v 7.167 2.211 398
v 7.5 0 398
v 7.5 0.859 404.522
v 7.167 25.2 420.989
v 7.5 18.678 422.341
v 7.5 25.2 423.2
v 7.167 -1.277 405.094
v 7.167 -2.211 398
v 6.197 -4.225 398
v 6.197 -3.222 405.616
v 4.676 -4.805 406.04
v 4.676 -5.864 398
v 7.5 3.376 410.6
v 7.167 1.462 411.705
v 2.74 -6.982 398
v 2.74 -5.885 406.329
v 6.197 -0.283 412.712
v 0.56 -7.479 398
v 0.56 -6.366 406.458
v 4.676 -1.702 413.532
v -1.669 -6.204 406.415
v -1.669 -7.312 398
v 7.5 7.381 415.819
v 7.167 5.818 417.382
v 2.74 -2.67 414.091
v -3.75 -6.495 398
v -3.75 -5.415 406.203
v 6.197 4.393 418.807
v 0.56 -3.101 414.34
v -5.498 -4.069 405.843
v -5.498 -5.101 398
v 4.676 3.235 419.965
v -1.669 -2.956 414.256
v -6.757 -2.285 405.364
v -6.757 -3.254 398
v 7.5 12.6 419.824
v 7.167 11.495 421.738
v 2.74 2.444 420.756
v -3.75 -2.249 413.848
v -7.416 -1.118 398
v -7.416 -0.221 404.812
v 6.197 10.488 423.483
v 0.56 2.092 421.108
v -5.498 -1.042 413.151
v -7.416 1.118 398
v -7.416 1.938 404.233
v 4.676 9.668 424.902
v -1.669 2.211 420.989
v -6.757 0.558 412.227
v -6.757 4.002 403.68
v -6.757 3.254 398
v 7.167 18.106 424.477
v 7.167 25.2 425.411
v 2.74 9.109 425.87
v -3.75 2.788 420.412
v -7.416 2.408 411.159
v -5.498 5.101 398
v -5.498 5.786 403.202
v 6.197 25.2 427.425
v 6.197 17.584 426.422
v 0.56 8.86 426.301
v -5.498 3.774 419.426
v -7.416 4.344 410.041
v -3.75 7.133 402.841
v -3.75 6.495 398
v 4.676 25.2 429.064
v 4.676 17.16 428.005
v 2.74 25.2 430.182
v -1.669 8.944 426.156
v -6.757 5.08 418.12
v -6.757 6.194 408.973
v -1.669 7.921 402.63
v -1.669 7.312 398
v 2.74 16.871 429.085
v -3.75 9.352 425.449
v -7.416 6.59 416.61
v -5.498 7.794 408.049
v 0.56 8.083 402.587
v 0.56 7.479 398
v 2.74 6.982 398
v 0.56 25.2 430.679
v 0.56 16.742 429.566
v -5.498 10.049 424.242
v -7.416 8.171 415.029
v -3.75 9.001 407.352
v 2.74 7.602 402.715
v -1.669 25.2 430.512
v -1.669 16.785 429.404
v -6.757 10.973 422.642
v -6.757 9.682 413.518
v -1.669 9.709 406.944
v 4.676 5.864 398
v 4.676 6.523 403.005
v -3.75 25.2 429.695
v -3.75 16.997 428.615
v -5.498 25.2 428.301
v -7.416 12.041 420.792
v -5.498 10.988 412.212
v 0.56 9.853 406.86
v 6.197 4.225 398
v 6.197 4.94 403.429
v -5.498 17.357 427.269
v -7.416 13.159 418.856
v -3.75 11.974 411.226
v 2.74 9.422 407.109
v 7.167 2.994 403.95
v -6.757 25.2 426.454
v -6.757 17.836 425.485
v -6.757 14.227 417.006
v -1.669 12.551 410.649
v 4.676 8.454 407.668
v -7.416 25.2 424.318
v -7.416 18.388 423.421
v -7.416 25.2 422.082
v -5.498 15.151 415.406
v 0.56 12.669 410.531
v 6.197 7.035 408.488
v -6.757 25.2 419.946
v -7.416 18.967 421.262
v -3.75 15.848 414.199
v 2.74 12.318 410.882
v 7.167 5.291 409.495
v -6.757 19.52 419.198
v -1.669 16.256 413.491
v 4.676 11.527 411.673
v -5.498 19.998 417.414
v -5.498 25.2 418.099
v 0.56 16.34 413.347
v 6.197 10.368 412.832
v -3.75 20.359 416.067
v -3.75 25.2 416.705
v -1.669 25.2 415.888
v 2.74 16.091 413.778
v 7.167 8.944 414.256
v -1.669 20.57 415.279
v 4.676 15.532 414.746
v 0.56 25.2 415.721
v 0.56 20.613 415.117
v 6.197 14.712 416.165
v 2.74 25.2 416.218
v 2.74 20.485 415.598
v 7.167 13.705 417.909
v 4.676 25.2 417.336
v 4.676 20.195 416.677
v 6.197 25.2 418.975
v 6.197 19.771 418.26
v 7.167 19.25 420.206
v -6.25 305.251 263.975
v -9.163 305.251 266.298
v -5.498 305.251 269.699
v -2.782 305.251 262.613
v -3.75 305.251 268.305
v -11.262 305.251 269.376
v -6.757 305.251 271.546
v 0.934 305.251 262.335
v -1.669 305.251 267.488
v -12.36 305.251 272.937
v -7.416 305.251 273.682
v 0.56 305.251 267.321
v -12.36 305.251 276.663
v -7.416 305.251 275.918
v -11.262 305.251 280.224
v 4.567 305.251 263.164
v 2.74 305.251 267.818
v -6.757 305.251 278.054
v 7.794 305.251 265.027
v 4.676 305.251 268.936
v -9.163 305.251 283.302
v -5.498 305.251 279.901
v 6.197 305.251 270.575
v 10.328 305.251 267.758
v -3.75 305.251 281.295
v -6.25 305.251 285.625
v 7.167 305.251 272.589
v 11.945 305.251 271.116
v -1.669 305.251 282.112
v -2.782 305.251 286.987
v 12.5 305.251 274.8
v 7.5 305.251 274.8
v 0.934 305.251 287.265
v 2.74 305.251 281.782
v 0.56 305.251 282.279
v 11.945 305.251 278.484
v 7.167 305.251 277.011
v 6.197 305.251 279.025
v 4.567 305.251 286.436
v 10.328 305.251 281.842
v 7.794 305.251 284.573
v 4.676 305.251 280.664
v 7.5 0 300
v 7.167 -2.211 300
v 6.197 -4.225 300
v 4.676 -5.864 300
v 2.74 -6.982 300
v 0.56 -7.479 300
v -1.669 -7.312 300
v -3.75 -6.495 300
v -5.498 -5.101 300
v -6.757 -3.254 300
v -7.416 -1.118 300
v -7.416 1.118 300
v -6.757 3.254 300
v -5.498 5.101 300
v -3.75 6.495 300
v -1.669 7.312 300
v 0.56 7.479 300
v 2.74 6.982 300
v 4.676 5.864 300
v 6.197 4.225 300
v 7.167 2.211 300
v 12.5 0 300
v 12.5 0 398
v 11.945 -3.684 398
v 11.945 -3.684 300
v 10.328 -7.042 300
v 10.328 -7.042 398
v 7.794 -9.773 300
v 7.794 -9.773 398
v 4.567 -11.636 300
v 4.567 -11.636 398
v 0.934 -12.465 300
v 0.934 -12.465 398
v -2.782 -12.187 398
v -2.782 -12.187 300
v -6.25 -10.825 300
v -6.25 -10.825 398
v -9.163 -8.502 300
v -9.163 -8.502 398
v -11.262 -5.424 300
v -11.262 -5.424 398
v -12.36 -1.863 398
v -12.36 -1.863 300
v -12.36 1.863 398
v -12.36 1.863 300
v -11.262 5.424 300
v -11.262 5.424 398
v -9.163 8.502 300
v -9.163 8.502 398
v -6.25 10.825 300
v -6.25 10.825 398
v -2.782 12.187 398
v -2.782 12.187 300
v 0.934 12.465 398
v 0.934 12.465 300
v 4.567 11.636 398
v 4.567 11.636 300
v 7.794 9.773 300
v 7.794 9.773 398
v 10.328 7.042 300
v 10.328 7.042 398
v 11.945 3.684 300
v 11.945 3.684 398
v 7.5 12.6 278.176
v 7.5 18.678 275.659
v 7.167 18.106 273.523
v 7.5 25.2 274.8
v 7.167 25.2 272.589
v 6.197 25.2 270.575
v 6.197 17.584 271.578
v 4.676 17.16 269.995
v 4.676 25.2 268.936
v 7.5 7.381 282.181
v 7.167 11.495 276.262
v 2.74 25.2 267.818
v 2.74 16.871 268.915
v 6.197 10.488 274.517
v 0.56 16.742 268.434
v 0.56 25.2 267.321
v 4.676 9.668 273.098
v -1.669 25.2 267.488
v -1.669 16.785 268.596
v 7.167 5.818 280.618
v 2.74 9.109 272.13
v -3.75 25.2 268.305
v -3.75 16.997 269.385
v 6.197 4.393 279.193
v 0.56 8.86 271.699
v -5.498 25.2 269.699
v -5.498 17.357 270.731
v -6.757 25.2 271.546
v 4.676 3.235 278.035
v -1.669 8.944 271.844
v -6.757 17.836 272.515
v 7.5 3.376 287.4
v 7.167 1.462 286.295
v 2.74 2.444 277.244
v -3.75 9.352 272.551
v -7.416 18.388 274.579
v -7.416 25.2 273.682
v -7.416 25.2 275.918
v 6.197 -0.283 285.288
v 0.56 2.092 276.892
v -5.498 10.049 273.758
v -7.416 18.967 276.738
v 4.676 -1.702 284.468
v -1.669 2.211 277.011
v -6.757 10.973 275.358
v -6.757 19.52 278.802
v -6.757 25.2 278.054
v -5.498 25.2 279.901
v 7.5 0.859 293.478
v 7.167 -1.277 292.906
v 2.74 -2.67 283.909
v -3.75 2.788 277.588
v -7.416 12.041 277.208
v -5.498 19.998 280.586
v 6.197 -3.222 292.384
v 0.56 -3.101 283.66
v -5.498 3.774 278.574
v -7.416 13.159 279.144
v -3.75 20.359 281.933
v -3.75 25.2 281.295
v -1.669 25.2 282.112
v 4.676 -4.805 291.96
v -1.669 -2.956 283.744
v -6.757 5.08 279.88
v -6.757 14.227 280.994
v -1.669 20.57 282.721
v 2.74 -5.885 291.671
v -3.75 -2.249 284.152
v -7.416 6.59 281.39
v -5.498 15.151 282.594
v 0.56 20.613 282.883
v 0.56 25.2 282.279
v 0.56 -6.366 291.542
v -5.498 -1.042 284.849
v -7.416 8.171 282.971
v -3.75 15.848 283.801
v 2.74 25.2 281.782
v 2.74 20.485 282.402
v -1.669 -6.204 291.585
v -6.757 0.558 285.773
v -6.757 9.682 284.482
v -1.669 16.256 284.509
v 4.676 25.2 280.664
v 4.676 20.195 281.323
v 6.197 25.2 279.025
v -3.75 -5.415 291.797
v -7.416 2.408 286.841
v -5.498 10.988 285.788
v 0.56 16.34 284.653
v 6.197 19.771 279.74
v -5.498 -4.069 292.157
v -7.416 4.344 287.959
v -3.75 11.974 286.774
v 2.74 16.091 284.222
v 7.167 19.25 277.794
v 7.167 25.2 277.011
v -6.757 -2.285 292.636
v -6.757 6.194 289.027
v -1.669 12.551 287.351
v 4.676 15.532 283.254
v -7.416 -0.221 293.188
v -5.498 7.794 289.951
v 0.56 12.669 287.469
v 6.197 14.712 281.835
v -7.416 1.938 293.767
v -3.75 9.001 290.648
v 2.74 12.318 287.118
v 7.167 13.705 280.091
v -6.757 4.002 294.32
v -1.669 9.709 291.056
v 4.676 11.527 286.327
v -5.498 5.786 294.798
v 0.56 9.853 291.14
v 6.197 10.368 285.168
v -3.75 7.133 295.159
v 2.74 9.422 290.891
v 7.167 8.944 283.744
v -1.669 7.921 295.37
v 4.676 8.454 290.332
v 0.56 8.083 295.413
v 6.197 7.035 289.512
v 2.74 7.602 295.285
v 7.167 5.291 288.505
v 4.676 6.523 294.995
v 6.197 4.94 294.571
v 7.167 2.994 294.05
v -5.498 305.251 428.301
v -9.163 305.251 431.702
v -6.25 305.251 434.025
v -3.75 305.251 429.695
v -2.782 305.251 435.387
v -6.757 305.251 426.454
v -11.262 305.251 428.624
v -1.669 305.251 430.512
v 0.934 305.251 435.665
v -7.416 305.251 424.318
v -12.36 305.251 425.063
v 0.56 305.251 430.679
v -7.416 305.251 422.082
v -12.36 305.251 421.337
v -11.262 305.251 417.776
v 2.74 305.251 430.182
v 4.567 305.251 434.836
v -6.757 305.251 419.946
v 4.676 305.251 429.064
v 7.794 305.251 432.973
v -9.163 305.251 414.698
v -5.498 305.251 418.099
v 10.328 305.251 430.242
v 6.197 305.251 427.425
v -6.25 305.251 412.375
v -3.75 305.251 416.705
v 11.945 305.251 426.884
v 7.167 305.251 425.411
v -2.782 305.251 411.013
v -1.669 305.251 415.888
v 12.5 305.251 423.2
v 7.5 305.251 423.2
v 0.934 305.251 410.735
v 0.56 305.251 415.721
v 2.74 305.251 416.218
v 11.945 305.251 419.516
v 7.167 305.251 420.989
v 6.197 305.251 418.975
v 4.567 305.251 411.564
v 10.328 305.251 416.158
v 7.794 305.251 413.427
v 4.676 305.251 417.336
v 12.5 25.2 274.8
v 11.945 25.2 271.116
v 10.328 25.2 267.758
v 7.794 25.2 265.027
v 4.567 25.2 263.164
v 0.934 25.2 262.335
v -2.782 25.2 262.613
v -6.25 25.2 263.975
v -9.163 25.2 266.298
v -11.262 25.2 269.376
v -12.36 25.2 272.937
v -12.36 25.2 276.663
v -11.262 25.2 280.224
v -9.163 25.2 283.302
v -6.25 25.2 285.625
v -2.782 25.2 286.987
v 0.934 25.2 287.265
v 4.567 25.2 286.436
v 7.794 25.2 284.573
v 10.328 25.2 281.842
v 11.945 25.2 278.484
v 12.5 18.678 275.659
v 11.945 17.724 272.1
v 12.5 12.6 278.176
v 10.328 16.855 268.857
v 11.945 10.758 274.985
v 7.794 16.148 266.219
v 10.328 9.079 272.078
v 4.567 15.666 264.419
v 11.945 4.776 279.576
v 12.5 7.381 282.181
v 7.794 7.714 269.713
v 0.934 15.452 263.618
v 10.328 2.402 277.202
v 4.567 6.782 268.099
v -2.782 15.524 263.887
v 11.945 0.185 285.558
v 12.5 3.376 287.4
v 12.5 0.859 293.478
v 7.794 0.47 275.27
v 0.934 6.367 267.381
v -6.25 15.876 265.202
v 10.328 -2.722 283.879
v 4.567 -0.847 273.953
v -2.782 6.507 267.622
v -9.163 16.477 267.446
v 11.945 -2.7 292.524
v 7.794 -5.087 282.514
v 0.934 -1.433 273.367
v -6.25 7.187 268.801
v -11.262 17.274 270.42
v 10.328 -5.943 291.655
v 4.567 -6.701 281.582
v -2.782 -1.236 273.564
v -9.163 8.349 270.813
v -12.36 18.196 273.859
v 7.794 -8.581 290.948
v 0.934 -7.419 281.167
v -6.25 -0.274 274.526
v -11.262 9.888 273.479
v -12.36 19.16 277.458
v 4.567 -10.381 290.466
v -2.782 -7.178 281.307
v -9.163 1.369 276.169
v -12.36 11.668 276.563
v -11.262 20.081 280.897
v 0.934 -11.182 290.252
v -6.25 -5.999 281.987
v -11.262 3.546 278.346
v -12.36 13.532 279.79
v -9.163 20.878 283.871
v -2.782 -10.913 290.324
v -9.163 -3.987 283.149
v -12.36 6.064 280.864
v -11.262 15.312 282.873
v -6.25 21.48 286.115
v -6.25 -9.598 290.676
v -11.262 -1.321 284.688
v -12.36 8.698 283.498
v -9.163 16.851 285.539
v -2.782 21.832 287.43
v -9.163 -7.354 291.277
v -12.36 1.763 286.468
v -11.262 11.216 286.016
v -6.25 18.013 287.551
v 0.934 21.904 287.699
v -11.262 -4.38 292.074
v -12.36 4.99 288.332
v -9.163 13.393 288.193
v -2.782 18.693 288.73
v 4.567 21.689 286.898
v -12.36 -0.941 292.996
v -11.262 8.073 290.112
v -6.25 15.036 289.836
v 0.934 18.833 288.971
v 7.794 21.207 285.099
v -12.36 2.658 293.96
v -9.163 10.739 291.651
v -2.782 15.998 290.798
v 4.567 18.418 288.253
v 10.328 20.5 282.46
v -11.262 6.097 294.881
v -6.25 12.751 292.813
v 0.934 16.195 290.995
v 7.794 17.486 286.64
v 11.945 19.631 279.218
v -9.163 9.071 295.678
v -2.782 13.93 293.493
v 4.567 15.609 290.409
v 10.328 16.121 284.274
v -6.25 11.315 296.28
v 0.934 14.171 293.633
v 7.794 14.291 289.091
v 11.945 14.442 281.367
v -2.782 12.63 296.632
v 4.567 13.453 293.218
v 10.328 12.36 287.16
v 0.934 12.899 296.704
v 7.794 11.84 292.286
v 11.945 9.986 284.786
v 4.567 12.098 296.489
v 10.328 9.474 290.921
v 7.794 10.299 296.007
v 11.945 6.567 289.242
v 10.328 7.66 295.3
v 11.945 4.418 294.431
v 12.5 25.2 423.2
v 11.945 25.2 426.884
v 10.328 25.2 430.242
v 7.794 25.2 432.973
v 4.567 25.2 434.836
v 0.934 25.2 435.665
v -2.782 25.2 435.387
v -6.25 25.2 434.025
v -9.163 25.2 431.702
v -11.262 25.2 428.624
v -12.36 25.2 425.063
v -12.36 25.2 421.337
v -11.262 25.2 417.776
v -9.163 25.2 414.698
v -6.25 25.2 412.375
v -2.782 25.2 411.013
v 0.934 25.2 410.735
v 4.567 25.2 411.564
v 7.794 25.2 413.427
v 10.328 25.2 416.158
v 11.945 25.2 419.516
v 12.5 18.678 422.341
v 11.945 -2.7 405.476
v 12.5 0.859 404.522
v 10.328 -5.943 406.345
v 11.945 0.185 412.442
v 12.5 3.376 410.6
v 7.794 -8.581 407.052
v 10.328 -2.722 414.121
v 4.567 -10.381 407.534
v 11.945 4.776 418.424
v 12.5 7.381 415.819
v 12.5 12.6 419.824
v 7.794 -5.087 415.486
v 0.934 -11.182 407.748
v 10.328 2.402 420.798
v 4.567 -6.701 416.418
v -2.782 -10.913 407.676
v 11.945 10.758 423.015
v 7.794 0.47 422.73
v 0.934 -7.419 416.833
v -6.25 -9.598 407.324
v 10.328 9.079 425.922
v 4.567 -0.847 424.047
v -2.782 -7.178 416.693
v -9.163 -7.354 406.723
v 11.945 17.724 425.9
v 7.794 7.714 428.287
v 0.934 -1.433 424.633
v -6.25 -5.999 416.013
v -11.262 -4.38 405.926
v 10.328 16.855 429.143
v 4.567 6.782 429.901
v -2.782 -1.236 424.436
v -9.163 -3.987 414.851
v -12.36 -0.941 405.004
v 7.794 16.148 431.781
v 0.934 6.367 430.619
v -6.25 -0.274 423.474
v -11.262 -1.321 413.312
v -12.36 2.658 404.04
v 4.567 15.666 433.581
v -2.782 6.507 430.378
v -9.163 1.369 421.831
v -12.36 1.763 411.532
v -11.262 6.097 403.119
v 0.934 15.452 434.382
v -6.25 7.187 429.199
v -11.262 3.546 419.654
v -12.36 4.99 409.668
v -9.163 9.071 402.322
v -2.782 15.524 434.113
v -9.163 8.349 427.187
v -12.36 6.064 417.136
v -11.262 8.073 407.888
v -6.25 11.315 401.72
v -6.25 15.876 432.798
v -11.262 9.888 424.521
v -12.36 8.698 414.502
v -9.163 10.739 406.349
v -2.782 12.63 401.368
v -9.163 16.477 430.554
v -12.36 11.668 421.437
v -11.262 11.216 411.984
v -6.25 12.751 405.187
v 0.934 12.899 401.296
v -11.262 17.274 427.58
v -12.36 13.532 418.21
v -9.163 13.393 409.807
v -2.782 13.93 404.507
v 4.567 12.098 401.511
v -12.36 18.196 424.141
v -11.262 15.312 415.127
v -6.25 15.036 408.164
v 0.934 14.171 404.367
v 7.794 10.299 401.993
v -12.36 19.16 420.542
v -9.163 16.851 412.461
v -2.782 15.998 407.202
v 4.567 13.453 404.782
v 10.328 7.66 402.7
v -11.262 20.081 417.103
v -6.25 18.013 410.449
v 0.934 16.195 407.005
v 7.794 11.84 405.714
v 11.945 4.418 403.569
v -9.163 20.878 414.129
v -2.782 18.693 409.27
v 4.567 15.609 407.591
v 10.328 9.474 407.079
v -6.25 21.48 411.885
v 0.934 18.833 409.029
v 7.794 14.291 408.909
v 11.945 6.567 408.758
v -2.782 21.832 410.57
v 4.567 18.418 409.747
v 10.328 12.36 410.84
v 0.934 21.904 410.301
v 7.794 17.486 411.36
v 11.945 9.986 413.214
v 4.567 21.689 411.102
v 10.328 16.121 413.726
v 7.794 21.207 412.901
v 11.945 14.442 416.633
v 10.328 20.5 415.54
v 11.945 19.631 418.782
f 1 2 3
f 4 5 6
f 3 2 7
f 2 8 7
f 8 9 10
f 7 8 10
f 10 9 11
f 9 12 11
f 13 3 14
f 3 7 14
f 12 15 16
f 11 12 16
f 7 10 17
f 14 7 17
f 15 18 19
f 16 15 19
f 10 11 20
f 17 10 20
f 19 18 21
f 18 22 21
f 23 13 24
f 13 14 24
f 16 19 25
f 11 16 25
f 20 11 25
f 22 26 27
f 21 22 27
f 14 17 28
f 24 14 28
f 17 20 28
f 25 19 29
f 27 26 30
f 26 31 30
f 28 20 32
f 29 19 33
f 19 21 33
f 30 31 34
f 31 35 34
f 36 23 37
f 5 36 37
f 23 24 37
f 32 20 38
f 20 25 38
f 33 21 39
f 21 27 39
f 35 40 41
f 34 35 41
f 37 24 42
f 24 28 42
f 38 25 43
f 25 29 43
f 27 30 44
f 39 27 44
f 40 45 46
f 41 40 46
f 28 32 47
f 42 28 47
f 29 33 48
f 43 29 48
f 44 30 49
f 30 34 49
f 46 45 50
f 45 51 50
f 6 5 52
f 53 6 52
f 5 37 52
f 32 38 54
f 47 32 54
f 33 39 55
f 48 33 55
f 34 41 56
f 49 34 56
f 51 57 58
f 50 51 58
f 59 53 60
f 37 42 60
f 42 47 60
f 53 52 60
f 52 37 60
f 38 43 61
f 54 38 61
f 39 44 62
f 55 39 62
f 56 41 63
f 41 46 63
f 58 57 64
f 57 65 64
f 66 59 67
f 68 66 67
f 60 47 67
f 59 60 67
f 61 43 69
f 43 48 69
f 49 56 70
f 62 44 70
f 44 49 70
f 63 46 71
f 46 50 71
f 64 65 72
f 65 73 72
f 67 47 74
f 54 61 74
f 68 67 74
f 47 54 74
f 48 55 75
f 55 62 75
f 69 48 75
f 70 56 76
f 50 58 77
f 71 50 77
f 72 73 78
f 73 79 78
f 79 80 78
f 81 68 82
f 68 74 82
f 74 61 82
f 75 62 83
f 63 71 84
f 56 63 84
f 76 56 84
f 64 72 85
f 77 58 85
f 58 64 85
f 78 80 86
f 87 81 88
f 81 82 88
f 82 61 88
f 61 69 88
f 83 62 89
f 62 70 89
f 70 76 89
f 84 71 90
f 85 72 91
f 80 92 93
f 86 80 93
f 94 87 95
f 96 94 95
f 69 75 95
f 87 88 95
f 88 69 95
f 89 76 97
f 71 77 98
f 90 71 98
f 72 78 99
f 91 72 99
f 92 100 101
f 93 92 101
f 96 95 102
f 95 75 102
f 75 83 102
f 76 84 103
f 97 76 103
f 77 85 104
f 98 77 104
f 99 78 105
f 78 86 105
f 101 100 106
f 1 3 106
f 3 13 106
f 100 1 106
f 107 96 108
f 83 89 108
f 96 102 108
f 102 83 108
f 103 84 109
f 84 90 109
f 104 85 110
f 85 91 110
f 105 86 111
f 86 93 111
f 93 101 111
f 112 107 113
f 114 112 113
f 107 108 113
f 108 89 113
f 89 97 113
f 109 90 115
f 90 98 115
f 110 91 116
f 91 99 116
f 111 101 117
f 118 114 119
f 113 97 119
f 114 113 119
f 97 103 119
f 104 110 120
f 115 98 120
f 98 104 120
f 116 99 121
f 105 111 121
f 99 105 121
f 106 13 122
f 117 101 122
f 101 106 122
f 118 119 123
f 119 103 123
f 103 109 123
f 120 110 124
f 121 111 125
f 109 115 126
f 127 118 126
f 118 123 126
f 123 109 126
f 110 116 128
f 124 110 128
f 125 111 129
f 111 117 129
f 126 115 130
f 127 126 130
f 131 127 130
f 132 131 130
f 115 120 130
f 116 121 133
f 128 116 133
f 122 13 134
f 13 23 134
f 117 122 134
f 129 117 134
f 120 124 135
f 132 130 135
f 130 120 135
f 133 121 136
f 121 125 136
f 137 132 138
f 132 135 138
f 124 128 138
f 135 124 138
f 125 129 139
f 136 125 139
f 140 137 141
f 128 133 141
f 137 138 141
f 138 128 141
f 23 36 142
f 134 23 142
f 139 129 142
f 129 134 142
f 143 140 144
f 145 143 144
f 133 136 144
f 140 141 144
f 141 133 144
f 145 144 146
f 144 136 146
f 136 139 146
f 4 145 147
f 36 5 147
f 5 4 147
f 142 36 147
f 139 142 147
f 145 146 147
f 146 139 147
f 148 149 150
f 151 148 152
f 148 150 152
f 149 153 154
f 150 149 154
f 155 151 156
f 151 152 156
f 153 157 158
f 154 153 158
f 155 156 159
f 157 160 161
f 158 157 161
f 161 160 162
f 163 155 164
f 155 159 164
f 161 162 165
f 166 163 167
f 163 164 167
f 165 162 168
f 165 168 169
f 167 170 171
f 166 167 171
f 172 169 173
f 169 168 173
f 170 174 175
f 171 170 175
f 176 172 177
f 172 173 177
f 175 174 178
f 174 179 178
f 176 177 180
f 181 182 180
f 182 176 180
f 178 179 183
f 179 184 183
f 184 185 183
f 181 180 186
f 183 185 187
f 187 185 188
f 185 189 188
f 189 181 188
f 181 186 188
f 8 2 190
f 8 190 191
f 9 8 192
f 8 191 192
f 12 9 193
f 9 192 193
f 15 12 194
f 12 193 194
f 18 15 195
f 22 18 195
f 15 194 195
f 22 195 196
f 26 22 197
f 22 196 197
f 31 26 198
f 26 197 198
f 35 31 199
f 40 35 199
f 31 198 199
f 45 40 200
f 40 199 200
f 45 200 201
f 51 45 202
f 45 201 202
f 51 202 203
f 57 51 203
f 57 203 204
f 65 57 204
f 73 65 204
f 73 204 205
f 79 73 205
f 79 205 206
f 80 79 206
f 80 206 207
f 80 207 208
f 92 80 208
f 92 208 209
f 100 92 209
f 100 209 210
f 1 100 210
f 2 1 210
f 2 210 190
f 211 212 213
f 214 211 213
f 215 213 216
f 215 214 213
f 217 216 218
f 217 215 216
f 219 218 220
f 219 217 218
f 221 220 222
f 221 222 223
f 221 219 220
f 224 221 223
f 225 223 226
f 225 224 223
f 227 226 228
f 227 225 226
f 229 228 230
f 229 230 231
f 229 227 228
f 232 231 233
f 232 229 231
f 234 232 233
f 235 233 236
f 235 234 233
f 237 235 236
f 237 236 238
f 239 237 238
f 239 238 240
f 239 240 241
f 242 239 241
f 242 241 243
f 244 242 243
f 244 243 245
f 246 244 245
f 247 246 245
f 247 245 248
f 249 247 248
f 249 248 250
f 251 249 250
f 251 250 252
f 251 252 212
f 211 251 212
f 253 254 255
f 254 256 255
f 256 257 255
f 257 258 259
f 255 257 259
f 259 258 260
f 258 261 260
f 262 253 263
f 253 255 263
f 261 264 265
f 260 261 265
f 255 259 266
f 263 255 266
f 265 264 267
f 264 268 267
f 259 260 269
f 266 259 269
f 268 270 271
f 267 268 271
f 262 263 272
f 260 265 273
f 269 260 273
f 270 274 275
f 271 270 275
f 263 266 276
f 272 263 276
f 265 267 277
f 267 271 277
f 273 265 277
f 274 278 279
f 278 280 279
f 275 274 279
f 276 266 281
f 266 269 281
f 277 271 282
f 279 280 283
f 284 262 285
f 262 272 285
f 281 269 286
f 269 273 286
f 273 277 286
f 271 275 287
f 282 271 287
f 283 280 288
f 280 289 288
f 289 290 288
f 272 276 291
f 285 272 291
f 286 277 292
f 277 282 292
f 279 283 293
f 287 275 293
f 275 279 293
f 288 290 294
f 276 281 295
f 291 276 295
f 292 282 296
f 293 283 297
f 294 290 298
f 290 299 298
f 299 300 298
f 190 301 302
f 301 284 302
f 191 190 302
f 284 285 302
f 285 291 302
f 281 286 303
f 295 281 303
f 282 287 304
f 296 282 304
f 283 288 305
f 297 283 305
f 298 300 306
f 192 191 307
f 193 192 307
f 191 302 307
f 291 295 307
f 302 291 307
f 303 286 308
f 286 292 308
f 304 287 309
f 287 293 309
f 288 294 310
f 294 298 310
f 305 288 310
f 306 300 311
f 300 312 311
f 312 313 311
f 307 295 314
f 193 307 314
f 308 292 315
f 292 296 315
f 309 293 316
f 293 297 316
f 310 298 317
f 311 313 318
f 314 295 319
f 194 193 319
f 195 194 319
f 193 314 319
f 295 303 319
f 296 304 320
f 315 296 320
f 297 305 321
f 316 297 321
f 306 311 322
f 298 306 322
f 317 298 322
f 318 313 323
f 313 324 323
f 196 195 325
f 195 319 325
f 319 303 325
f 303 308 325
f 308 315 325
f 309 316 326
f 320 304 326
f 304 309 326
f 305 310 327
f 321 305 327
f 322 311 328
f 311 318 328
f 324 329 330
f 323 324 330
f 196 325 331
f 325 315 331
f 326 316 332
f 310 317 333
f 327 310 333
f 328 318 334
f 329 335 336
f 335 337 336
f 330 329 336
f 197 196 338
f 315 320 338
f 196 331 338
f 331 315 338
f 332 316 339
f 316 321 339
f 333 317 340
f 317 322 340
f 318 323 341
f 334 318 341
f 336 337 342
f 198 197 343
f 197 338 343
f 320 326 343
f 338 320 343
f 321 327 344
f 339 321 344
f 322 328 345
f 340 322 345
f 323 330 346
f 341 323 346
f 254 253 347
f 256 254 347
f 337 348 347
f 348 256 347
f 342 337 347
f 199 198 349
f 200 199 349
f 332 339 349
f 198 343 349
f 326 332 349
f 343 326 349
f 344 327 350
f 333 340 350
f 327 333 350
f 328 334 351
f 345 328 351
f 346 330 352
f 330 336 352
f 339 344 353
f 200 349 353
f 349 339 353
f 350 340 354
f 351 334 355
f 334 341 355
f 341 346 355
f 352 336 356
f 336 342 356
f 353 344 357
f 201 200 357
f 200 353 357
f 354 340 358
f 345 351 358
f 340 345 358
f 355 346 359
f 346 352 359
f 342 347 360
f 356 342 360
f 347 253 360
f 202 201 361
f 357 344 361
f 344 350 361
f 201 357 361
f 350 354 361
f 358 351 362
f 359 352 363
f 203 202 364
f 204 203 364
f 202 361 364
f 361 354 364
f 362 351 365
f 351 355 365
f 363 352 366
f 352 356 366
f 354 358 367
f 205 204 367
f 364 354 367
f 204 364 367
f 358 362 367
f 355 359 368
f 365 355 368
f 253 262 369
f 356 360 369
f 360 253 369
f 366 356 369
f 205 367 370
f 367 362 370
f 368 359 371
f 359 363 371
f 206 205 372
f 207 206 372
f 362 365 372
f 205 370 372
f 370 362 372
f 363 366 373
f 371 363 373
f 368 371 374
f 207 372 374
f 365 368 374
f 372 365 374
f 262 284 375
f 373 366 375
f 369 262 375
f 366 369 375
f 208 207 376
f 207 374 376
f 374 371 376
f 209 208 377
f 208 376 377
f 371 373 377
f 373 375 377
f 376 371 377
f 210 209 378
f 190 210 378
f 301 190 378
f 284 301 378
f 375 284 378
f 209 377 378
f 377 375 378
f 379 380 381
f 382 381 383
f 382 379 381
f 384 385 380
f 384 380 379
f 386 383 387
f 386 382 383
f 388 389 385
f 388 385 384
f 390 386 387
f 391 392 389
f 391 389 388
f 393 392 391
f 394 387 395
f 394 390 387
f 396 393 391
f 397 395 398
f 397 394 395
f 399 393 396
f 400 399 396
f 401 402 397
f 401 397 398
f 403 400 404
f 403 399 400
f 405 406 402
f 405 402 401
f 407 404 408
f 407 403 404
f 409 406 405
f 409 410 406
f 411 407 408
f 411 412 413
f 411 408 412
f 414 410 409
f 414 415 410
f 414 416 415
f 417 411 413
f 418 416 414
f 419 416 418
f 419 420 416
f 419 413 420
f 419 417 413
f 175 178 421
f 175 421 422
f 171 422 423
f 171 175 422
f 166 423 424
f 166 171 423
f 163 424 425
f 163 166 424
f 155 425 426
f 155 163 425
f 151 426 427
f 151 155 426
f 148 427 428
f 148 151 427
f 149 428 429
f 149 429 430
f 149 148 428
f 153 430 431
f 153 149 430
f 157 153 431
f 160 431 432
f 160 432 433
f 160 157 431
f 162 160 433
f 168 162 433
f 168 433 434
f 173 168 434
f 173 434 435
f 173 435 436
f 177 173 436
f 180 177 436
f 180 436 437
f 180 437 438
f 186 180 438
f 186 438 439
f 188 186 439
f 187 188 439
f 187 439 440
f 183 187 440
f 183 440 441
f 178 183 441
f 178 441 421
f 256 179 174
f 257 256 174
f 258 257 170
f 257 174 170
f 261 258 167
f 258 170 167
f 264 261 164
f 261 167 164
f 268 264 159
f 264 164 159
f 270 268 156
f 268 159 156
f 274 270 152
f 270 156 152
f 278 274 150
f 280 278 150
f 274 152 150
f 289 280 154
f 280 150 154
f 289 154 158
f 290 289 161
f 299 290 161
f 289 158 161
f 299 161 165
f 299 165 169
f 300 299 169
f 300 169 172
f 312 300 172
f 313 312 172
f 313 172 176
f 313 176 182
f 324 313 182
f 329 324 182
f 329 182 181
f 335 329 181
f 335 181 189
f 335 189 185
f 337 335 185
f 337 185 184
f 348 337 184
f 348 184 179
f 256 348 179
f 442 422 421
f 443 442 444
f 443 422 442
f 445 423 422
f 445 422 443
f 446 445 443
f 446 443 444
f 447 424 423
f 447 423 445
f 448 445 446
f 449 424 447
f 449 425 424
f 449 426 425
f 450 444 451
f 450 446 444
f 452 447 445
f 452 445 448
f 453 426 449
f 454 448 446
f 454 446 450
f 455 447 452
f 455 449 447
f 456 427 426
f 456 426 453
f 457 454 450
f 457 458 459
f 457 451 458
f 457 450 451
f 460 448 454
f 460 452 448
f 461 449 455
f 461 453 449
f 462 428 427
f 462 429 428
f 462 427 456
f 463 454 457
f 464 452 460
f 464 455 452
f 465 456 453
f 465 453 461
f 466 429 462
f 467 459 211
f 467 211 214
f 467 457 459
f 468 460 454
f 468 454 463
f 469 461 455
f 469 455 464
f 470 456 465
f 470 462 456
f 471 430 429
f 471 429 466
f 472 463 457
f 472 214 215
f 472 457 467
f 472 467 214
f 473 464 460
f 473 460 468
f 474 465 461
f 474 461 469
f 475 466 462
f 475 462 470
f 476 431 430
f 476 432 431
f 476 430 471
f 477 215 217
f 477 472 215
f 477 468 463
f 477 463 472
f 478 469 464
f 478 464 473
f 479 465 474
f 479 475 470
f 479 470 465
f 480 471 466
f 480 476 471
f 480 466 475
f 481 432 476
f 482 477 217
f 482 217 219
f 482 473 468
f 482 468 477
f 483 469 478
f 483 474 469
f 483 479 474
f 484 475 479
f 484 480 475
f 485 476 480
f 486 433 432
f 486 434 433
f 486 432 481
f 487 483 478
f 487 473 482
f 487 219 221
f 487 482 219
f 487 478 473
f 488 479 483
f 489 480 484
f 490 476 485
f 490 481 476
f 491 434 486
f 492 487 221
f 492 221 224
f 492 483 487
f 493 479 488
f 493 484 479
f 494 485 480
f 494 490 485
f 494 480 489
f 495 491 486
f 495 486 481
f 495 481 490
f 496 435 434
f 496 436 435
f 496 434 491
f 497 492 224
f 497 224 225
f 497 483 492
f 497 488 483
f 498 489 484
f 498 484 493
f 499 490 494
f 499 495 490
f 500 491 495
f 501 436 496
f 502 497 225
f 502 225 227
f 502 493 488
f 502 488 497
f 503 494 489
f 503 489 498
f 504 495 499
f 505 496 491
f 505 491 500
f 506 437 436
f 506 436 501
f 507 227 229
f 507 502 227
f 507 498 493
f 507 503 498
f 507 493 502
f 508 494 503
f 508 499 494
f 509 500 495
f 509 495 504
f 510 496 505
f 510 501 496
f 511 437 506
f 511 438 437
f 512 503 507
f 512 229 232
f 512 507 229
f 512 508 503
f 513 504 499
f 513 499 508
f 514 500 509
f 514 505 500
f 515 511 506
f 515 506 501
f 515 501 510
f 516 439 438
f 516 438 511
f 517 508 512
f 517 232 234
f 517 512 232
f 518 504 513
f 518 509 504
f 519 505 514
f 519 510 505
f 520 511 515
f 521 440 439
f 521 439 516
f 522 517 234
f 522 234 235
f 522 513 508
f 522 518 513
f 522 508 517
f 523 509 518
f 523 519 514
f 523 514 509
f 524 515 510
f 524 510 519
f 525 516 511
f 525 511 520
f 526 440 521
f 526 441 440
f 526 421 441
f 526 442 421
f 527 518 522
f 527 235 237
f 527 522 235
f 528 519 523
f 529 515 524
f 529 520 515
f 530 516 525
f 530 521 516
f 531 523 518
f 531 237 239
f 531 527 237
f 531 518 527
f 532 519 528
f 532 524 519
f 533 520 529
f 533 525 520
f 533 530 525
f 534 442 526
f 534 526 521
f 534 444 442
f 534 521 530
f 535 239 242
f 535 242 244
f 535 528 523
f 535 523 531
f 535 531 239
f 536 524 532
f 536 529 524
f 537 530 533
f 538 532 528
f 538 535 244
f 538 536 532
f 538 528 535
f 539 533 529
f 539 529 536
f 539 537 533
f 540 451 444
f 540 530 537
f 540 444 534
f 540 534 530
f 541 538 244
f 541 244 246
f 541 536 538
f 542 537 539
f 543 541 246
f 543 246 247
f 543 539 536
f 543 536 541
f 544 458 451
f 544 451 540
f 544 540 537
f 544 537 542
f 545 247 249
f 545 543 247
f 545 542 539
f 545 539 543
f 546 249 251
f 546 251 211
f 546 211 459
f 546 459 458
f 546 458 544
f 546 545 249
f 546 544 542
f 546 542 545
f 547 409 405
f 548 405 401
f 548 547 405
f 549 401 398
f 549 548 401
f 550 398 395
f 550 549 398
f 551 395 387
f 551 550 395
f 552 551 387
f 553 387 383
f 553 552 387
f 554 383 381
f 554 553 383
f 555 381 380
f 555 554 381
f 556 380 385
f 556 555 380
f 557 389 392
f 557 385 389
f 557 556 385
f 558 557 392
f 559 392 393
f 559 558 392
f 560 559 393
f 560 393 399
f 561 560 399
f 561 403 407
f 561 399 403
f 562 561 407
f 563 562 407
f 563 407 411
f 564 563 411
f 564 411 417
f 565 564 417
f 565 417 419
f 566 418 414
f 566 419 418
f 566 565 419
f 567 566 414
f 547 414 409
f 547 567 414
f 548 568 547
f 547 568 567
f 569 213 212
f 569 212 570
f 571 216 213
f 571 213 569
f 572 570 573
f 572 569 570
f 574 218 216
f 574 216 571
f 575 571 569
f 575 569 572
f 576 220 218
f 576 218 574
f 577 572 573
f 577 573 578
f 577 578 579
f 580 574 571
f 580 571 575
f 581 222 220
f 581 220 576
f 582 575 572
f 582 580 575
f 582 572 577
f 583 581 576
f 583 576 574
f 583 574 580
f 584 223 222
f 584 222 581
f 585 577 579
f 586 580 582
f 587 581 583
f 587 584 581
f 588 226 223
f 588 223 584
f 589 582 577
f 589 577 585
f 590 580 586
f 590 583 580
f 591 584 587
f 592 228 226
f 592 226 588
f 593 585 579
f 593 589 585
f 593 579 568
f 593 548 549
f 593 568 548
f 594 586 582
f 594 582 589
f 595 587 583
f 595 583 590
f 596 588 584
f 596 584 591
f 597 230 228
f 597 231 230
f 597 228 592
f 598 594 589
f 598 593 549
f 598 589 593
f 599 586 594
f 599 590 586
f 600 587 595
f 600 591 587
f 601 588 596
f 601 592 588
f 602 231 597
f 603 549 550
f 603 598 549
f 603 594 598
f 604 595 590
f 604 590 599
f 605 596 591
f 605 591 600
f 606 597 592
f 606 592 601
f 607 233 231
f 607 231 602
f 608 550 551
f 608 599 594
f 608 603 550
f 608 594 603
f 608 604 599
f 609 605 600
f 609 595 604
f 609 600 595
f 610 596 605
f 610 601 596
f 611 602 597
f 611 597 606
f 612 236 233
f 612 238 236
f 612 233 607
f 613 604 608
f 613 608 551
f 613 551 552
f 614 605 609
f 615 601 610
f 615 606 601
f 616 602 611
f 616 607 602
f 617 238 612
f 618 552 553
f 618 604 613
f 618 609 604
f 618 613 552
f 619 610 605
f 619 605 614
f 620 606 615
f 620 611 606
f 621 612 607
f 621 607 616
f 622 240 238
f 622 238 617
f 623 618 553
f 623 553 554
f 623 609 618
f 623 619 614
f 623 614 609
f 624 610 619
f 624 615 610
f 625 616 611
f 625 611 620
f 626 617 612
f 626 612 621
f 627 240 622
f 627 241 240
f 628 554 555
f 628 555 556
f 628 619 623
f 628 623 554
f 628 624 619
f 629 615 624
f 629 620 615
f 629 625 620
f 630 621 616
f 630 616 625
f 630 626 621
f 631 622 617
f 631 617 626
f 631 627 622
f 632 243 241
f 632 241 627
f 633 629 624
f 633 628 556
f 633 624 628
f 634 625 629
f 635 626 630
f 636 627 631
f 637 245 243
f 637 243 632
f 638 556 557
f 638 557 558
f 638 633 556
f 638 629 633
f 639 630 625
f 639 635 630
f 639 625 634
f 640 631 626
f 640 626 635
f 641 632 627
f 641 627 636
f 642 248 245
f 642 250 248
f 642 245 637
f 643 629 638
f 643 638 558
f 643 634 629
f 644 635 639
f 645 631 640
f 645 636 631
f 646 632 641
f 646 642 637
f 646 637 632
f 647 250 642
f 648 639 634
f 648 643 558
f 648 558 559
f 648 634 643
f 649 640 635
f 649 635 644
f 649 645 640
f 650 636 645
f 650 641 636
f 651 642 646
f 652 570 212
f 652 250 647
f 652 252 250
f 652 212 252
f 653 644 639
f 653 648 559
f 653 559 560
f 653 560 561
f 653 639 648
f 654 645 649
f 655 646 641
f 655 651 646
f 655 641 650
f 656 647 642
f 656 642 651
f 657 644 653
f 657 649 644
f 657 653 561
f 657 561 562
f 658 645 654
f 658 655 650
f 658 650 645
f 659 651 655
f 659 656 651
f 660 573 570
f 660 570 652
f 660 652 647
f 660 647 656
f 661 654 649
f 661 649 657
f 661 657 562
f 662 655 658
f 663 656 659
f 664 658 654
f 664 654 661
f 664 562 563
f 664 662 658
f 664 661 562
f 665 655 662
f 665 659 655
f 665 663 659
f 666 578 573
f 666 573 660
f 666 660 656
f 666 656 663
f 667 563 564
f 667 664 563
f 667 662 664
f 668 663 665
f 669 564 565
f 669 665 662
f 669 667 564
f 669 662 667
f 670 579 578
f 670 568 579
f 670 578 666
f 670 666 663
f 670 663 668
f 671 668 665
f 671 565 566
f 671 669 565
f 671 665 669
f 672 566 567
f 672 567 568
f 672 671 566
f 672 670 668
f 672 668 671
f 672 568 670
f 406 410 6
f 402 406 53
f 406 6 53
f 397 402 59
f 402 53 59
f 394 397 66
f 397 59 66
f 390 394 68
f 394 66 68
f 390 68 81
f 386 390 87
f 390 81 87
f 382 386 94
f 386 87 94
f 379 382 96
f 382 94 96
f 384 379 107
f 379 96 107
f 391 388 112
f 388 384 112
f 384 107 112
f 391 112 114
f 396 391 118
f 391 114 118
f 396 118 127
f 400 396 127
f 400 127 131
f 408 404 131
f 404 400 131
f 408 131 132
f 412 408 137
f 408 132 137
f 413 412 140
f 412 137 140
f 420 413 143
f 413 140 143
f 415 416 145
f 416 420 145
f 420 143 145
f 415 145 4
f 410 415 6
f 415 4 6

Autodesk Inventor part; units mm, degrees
ref_plane "YZ Plane" through (0, 0, 0) normal (1, 0, 0) x (0, 1, 0)
ref_plane "XY Plane" through (0, 0, 0) normal (0, 0, 1) x (1, 0, 0)
sketch "Sketch1" plane through (0, 0, 0) normal (0, 0, 1) x (1, 0, 0)
  circle A0 centre (0, 0) radius 7.5
  circle A1 centre (0, 0) radius 12.5
  dimension "d0" = 15
  dimension "d1" = 25
extrude "Extrusion1" add sketch "Sketch1" along normal blind 698
ref_plane "Work Plane2" through (0, 12.5, 0) normal (0, 1, 0) x (-1, 0, 0)
sketch "Sketch3" plane through (0, 12.5, 0) normal (0, 1, 0) x (-1, 0, 0)
  line L0 (219.2482, 398) -> (-262.0284, 398)
  line L1 (12.5, 698) -> (-12.5, 698) projected
  line L2 (351.4203, 300) -> (-288.0764, 300)
  line L3 (12.5, 0) -> (-12.5, 0) projected
  point P0 (0, 0)
  dimension "d7" = 300
  dimension "d8" = 300
bend part "Bend Part1" radius 12.7 angle 90 line through (-219.2482, 12.5, 398) along (1, 0, 0) centre toward (0, 1, 0) moving side (0, 0, 1) both sides no
sketch "Sketch4" plane through (0, 12.5, 0) normal (0, 1, 0) x (-1, 0, 0)
  line L0 (312.7899, 300) -> (-276.8847, 300)
  line L1 (12.5, 0) -> (-12.5, 0) projected
  point P0 (0, 0)
  dimension "d11" = 300
bend part "Bend Part2" radius 12.7 angle 90 line through (-312.7899, 12.5, 300) along (1, 0, 0) centre toward (0, 1, 0) moving side (0, 0, -1) both sides no
sketch "Sketch5" plane through (0, 305.2509, 423.2) normal (0, 1, 0) x (1, 0, 0)
  point P0 (0, 423.2)
properties part number "Seat Link"
